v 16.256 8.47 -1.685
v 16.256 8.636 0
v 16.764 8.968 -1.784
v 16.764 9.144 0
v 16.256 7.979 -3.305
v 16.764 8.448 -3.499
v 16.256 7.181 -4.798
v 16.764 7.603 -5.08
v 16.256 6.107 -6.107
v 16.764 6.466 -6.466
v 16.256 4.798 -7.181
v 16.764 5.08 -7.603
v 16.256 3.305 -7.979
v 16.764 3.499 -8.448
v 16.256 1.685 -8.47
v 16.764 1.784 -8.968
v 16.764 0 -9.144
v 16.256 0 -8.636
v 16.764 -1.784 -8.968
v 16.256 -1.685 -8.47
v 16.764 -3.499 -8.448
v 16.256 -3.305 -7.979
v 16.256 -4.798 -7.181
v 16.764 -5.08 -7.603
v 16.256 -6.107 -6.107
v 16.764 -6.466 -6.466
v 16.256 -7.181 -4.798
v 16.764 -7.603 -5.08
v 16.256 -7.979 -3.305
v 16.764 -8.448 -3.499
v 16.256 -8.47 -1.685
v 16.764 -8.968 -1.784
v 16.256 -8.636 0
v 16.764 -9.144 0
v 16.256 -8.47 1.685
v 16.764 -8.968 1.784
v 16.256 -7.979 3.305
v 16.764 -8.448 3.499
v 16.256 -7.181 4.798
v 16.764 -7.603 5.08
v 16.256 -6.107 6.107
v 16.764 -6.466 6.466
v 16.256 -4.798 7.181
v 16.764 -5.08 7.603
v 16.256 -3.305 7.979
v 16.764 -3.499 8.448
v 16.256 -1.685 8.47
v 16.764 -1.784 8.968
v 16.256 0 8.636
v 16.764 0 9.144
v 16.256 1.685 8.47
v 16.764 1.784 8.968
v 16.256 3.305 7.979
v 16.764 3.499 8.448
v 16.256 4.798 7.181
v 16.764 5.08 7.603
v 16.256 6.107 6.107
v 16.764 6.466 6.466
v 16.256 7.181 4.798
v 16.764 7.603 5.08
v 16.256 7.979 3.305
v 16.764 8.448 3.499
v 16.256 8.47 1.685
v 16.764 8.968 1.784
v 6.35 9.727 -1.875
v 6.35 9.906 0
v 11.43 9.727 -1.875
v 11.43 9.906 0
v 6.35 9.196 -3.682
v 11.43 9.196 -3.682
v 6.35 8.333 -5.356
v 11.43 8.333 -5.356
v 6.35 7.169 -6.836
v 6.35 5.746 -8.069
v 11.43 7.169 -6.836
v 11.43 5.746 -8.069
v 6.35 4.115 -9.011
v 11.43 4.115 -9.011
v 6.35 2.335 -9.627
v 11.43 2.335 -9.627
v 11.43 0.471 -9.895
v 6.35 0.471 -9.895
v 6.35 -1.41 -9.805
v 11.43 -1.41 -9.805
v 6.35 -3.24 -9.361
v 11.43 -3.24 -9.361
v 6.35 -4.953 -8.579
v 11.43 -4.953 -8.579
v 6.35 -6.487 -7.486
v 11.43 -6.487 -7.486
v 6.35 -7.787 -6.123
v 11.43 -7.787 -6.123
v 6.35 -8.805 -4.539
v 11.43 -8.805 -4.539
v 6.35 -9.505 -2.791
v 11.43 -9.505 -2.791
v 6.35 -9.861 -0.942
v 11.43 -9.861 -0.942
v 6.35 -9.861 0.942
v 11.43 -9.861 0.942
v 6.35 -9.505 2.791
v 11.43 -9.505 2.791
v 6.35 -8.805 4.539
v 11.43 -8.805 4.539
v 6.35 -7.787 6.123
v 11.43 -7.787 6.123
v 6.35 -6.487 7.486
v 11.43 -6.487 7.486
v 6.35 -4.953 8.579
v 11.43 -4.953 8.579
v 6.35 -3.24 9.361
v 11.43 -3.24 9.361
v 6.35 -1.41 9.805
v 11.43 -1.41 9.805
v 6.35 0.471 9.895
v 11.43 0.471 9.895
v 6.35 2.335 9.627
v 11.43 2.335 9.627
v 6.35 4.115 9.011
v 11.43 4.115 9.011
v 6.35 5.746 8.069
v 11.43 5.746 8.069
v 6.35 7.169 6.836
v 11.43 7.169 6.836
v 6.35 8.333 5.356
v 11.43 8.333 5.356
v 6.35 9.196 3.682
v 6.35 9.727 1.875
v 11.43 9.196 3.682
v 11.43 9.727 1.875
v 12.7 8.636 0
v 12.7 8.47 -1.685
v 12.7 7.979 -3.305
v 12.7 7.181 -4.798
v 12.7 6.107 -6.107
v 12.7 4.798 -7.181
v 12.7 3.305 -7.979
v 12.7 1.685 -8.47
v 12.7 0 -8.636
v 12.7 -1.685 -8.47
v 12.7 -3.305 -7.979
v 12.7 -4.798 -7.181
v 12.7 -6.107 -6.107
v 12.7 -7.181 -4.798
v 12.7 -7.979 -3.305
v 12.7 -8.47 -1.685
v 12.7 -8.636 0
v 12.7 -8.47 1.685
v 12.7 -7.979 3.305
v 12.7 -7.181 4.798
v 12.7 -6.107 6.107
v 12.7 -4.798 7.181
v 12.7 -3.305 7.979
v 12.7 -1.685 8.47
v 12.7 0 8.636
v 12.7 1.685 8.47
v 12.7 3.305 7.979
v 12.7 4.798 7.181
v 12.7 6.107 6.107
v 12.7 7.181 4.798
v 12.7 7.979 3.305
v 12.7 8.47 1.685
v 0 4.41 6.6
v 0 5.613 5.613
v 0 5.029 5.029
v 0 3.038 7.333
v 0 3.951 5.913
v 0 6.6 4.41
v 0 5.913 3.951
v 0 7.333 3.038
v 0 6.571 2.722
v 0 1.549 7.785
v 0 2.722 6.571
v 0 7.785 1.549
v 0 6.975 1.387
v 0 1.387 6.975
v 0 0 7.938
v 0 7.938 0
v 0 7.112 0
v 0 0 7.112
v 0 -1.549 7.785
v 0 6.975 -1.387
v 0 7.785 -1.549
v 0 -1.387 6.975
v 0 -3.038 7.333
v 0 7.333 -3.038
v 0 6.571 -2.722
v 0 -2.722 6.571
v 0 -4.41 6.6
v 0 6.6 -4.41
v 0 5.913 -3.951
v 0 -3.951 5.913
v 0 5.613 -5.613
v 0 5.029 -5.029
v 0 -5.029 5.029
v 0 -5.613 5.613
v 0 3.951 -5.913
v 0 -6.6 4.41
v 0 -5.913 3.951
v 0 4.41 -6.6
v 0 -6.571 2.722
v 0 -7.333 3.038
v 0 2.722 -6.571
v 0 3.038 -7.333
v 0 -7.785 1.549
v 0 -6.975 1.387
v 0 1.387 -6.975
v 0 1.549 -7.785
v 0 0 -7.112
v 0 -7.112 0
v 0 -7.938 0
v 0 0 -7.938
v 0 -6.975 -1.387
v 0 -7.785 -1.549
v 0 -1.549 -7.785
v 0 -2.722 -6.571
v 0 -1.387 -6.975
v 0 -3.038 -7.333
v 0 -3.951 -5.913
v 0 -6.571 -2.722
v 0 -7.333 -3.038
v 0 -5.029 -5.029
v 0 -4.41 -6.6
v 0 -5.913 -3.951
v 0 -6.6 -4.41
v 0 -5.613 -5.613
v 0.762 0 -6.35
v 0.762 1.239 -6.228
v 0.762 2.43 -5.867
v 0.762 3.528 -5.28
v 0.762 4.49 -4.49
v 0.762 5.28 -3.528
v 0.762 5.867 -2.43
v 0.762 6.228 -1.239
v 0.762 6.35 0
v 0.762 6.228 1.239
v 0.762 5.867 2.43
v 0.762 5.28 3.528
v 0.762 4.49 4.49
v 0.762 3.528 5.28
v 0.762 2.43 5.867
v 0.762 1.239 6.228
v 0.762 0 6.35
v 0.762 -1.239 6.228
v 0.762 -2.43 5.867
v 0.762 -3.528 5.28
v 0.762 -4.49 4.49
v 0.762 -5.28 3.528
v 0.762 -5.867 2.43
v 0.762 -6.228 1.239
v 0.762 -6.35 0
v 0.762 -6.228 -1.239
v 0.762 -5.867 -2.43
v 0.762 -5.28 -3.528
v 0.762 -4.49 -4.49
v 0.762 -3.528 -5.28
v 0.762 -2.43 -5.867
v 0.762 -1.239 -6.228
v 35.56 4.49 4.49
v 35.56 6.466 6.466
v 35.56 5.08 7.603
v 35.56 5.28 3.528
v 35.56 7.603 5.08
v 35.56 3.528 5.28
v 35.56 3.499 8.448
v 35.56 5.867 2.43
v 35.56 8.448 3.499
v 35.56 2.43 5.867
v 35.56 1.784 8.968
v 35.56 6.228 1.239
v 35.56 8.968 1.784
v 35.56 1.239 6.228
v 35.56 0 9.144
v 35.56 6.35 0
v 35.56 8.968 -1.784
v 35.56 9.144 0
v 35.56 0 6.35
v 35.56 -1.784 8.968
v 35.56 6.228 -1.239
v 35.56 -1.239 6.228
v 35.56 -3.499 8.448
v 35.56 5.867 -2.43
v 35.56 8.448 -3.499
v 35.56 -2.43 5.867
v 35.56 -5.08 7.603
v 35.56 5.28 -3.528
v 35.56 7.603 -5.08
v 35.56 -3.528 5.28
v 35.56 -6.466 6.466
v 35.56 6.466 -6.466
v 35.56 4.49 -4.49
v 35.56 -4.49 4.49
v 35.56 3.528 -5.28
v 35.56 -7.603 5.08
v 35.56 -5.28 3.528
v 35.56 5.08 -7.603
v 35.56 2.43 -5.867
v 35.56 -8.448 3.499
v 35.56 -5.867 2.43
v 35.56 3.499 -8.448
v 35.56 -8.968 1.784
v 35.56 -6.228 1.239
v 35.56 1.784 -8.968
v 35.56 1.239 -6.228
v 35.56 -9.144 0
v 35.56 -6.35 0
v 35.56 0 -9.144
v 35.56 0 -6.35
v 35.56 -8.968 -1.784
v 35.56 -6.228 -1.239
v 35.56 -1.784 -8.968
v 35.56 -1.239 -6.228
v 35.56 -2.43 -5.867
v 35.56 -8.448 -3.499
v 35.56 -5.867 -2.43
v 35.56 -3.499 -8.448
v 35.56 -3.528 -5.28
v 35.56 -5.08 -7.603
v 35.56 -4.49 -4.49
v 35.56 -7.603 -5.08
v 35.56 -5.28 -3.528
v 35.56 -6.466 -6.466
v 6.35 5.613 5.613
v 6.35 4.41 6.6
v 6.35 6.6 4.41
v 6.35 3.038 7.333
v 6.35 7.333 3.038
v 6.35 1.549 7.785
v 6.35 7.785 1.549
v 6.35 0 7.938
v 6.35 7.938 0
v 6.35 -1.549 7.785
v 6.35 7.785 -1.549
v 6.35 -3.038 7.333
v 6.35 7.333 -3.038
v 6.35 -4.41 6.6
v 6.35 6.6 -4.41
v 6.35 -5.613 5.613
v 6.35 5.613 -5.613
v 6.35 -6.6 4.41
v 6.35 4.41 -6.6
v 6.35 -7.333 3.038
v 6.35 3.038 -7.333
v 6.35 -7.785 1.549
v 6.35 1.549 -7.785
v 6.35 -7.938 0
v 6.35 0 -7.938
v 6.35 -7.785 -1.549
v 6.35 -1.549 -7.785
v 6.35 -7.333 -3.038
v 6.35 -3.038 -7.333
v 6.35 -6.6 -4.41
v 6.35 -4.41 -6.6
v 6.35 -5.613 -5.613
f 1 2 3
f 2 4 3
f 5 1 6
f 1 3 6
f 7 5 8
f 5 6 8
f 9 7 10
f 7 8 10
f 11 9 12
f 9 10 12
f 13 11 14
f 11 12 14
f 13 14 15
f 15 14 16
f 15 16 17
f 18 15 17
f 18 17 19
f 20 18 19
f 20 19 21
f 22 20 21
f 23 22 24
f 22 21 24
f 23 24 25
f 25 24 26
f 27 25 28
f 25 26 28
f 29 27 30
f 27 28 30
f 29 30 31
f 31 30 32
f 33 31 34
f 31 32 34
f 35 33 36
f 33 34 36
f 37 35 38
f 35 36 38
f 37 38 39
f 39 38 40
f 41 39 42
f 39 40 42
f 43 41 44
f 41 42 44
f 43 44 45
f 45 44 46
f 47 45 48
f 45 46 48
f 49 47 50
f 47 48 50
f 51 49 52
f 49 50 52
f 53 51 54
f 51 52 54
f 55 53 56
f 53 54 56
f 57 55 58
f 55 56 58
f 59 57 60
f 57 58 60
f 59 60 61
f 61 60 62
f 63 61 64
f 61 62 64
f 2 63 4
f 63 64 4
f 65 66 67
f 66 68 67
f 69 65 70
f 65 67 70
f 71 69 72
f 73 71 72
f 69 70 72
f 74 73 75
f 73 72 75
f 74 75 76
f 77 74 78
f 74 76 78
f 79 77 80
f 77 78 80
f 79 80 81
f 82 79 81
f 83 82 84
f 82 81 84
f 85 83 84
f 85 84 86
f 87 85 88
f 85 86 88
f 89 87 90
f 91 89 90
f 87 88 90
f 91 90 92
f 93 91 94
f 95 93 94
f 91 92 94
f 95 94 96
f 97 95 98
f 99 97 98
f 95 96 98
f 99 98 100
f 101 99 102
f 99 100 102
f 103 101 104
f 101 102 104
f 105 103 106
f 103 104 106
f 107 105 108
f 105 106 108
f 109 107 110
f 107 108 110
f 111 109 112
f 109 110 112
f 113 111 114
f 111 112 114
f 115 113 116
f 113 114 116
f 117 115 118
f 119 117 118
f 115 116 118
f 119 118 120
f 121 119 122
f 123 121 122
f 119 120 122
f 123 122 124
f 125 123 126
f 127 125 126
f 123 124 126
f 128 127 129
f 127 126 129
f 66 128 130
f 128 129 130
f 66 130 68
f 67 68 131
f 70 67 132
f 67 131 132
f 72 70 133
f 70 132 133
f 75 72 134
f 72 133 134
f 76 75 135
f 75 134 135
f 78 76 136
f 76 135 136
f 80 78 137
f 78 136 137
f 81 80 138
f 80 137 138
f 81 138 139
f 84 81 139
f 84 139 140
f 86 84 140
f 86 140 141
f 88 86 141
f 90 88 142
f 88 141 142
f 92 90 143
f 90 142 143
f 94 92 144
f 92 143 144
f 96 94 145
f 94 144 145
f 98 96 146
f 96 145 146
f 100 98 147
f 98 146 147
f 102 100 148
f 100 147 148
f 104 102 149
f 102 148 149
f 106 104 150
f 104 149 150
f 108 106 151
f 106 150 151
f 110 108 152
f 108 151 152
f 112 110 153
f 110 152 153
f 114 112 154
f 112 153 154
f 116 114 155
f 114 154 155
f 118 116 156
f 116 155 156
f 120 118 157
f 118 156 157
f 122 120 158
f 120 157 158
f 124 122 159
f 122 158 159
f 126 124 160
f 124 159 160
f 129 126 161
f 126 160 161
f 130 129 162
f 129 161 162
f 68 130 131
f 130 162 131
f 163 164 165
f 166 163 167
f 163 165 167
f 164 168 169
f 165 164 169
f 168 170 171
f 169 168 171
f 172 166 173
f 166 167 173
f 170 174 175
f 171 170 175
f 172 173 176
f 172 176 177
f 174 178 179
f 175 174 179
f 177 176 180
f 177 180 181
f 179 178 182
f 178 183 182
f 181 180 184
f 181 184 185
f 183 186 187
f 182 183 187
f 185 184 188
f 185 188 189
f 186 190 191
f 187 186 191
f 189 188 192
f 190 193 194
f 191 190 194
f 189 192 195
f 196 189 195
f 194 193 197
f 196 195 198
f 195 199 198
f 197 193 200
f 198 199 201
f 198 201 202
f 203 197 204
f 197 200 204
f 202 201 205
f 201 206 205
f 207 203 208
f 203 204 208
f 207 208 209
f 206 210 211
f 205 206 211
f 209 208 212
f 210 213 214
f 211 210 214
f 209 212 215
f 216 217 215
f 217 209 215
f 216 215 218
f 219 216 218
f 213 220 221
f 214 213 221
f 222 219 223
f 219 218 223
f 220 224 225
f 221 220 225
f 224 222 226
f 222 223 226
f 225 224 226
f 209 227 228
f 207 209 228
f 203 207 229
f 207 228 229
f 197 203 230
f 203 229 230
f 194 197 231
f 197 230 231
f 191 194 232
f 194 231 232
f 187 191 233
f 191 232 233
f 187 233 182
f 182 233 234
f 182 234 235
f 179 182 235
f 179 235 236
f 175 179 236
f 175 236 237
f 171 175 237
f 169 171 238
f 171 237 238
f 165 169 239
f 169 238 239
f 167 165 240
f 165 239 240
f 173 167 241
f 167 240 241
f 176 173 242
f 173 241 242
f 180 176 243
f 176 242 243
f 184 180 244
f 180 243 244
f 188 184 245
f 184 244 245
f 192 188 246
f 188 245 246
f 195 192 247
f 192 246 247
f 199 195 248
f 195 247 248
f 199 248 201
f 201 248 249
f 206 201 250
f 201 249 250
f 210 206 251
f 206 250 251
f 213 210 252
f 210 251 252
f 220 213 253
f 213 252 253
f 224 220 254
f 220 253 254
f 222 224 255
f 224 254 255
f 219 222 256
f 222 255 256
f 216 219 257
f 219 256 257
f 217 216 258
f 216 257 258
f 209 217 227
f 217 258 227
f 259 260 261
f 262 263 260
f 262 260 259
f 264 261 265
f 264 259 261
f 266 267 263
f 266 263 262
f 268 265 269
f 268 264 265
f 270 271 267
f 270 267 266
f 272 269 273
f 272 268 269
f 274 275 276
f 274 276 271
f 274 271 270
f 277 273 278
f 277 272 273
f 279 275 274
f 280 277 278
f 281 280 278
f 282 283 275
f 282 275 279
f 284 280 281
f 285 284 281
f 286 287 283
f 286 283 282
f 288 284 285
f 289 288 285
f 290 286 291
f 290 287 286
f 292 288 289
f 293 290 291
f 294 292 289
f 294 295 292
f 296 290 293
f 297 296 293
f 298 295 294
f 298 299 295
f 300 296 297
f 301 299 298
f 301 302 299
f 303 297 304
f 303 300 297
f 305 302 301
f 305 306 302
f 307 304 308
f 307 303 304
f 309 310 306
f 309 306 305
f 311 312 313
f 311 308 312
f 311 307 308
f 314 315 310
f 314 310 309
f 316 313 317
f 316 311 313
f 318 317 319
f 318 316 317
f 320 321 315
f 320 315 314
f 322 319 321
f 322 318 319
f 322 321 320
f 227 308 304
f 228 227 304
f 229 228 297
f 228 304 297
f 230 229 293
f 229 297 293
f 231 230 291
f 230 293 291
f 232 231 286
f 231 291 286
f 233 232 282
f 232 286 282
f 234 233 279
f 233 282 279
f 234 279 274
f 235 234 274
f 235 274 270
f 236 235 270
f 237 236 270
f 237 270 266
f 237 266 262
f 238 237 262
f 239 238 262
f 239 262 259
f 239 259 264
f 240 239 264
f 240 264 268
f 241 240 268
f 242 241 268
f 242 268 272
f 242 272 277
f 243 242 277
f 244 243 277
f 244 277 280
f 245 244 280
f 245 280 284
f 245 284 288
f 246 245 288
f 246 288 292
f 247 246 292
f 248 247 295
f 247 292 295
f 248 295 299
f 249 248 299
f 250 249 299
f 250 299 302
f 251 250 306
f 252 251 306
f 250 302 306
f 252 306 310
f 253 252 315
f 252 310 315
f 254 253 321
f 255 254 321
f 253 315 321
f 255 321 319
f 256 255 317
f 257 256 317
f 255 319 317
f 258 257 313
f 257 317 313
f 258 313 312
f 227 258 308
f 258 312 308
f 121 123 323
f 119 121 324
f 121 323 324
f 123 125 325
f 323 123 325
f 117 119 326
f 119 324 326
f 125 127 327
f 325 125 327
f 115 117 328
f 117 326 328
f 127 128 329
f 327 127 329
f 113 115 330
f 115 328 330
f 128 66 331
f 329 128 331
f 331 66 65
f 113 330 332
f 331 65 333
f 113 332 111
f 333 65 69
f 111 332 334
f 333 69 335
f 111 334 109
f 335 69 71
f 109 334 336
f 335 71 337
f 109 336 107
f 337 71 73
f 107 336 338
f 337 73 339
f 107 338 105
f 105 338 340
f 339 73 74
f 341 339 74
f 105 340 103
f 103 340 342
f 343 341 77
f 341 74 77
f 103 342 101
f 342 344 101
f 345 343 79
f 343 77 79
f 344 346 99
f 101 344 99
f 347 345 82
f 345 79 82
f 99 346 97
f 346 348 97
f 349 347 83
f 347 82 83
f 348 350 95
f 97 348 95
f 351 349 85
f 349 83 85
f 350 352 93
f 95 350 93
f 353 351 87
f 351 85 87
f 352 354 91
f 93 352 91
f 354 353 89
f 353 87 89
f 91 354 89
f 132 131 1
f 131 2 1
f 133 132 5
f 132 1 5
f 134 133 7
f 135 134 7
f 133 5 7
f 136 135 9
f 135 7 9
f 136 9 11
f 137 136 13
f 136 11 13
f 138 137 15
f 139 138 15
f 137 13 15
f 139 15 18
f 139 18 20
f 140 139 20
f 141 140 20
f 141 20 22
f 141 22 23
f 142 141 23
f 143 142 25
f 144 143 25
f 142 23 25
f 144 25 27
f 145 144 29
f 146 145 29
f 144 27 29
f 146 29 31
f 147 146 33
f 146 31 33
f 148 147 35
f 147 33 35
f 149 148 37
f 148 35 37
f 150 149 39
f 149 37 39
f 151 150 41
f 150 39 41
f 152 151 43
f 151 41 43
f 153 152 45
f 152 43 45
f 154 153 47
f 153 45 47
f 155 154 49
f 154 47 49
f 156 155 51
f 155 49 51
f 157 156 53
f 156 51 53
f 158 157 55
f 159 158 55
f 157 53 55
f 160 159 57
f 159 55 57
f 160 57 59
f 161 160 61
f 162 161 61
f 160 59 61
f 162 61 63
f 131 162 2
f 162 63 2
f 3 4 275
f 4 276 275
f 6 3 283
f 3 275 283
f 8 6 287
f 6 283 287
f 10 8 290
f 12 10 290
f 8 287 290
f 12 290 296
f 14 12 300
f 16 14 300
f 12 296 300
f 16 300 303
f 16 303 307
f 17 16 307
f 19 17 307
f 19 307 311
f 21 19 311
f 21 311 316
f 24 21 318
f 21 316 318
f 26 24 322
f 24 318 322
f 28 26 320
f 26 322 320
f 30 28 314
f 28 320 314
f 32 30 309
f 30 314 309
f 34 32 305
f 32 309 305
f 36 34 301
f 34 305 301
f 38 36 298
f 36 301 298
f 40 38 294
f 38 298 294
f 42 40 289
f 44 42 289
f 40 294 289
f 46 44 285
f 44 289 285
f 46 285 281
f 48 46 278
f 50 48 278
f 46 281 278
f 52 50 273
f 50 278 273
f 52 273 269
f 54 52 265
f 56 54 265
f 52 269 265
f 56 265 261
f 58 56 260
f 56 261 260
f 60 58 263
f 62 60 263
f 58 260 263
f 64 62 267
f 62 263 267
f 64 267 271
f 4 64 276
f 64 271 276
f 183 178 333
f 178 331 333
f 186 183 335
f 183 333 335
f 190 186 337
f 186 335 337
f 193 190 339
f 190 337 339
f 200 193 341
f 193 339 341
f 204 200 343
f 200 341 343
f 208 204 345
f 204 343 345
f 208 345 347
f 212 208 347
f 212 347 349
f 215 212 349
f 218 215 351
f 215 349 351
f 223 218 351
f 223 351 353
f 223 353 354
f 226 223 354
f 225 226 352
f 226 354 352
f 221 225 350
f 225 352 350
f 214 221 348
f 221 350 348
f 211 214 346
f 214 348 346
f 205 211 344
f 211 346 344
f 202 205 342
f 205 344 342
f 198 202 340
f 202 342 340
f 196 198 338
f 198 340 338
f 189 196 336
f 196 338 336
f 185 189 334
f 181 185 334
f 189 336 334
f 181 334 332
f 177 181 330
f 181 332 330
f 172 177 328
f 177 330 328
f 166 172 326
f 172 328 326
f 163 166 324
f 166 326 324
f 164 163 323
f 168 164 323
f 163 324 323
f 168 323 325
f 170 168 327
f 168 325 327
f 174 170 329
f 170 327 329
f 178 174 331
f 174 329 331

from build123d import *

# Parameters (mm, degrees)
F_1_2_0_5_DIAMETER_HOLE1_D = 12.7
CHAMFER1_SIZE              = 0.762


with BuildPart() as part:
    # Sketch1 → Revolve1 (revolve)
    with BuildSketch(Plane.XY):
        Polygon((6.35, 7.9375), (6.35, 9.906), (11.43, 9.906), (12.7, 8.636), (16.256, 8.636), (16.764, 9.144), (35.56, 9.144), (35.56, 5.08), (35.56, 0), (0, 0), (0, 7.9375), align=None)
    revolve(axis=Axis((35.56, 0, 0), (-1, 0, 0)))

    # 1/2 (0.5) Diameter Hole1 (through all)
    with Locations(Plane.ZY):
        with Locations((0, 0)):
            Hole(F_1_2_0_5_DIAMETER_HOLE1_D / 2)

    # Chamfer1
    chamfer1_edges = [part.edges().sort_by_distance(p)[0] for p in [
        (0, 0, 6.35),
    ]]
    chamfer(chamfer1_edges, length=CHAMFER1_SIZE)


solid = part.part
